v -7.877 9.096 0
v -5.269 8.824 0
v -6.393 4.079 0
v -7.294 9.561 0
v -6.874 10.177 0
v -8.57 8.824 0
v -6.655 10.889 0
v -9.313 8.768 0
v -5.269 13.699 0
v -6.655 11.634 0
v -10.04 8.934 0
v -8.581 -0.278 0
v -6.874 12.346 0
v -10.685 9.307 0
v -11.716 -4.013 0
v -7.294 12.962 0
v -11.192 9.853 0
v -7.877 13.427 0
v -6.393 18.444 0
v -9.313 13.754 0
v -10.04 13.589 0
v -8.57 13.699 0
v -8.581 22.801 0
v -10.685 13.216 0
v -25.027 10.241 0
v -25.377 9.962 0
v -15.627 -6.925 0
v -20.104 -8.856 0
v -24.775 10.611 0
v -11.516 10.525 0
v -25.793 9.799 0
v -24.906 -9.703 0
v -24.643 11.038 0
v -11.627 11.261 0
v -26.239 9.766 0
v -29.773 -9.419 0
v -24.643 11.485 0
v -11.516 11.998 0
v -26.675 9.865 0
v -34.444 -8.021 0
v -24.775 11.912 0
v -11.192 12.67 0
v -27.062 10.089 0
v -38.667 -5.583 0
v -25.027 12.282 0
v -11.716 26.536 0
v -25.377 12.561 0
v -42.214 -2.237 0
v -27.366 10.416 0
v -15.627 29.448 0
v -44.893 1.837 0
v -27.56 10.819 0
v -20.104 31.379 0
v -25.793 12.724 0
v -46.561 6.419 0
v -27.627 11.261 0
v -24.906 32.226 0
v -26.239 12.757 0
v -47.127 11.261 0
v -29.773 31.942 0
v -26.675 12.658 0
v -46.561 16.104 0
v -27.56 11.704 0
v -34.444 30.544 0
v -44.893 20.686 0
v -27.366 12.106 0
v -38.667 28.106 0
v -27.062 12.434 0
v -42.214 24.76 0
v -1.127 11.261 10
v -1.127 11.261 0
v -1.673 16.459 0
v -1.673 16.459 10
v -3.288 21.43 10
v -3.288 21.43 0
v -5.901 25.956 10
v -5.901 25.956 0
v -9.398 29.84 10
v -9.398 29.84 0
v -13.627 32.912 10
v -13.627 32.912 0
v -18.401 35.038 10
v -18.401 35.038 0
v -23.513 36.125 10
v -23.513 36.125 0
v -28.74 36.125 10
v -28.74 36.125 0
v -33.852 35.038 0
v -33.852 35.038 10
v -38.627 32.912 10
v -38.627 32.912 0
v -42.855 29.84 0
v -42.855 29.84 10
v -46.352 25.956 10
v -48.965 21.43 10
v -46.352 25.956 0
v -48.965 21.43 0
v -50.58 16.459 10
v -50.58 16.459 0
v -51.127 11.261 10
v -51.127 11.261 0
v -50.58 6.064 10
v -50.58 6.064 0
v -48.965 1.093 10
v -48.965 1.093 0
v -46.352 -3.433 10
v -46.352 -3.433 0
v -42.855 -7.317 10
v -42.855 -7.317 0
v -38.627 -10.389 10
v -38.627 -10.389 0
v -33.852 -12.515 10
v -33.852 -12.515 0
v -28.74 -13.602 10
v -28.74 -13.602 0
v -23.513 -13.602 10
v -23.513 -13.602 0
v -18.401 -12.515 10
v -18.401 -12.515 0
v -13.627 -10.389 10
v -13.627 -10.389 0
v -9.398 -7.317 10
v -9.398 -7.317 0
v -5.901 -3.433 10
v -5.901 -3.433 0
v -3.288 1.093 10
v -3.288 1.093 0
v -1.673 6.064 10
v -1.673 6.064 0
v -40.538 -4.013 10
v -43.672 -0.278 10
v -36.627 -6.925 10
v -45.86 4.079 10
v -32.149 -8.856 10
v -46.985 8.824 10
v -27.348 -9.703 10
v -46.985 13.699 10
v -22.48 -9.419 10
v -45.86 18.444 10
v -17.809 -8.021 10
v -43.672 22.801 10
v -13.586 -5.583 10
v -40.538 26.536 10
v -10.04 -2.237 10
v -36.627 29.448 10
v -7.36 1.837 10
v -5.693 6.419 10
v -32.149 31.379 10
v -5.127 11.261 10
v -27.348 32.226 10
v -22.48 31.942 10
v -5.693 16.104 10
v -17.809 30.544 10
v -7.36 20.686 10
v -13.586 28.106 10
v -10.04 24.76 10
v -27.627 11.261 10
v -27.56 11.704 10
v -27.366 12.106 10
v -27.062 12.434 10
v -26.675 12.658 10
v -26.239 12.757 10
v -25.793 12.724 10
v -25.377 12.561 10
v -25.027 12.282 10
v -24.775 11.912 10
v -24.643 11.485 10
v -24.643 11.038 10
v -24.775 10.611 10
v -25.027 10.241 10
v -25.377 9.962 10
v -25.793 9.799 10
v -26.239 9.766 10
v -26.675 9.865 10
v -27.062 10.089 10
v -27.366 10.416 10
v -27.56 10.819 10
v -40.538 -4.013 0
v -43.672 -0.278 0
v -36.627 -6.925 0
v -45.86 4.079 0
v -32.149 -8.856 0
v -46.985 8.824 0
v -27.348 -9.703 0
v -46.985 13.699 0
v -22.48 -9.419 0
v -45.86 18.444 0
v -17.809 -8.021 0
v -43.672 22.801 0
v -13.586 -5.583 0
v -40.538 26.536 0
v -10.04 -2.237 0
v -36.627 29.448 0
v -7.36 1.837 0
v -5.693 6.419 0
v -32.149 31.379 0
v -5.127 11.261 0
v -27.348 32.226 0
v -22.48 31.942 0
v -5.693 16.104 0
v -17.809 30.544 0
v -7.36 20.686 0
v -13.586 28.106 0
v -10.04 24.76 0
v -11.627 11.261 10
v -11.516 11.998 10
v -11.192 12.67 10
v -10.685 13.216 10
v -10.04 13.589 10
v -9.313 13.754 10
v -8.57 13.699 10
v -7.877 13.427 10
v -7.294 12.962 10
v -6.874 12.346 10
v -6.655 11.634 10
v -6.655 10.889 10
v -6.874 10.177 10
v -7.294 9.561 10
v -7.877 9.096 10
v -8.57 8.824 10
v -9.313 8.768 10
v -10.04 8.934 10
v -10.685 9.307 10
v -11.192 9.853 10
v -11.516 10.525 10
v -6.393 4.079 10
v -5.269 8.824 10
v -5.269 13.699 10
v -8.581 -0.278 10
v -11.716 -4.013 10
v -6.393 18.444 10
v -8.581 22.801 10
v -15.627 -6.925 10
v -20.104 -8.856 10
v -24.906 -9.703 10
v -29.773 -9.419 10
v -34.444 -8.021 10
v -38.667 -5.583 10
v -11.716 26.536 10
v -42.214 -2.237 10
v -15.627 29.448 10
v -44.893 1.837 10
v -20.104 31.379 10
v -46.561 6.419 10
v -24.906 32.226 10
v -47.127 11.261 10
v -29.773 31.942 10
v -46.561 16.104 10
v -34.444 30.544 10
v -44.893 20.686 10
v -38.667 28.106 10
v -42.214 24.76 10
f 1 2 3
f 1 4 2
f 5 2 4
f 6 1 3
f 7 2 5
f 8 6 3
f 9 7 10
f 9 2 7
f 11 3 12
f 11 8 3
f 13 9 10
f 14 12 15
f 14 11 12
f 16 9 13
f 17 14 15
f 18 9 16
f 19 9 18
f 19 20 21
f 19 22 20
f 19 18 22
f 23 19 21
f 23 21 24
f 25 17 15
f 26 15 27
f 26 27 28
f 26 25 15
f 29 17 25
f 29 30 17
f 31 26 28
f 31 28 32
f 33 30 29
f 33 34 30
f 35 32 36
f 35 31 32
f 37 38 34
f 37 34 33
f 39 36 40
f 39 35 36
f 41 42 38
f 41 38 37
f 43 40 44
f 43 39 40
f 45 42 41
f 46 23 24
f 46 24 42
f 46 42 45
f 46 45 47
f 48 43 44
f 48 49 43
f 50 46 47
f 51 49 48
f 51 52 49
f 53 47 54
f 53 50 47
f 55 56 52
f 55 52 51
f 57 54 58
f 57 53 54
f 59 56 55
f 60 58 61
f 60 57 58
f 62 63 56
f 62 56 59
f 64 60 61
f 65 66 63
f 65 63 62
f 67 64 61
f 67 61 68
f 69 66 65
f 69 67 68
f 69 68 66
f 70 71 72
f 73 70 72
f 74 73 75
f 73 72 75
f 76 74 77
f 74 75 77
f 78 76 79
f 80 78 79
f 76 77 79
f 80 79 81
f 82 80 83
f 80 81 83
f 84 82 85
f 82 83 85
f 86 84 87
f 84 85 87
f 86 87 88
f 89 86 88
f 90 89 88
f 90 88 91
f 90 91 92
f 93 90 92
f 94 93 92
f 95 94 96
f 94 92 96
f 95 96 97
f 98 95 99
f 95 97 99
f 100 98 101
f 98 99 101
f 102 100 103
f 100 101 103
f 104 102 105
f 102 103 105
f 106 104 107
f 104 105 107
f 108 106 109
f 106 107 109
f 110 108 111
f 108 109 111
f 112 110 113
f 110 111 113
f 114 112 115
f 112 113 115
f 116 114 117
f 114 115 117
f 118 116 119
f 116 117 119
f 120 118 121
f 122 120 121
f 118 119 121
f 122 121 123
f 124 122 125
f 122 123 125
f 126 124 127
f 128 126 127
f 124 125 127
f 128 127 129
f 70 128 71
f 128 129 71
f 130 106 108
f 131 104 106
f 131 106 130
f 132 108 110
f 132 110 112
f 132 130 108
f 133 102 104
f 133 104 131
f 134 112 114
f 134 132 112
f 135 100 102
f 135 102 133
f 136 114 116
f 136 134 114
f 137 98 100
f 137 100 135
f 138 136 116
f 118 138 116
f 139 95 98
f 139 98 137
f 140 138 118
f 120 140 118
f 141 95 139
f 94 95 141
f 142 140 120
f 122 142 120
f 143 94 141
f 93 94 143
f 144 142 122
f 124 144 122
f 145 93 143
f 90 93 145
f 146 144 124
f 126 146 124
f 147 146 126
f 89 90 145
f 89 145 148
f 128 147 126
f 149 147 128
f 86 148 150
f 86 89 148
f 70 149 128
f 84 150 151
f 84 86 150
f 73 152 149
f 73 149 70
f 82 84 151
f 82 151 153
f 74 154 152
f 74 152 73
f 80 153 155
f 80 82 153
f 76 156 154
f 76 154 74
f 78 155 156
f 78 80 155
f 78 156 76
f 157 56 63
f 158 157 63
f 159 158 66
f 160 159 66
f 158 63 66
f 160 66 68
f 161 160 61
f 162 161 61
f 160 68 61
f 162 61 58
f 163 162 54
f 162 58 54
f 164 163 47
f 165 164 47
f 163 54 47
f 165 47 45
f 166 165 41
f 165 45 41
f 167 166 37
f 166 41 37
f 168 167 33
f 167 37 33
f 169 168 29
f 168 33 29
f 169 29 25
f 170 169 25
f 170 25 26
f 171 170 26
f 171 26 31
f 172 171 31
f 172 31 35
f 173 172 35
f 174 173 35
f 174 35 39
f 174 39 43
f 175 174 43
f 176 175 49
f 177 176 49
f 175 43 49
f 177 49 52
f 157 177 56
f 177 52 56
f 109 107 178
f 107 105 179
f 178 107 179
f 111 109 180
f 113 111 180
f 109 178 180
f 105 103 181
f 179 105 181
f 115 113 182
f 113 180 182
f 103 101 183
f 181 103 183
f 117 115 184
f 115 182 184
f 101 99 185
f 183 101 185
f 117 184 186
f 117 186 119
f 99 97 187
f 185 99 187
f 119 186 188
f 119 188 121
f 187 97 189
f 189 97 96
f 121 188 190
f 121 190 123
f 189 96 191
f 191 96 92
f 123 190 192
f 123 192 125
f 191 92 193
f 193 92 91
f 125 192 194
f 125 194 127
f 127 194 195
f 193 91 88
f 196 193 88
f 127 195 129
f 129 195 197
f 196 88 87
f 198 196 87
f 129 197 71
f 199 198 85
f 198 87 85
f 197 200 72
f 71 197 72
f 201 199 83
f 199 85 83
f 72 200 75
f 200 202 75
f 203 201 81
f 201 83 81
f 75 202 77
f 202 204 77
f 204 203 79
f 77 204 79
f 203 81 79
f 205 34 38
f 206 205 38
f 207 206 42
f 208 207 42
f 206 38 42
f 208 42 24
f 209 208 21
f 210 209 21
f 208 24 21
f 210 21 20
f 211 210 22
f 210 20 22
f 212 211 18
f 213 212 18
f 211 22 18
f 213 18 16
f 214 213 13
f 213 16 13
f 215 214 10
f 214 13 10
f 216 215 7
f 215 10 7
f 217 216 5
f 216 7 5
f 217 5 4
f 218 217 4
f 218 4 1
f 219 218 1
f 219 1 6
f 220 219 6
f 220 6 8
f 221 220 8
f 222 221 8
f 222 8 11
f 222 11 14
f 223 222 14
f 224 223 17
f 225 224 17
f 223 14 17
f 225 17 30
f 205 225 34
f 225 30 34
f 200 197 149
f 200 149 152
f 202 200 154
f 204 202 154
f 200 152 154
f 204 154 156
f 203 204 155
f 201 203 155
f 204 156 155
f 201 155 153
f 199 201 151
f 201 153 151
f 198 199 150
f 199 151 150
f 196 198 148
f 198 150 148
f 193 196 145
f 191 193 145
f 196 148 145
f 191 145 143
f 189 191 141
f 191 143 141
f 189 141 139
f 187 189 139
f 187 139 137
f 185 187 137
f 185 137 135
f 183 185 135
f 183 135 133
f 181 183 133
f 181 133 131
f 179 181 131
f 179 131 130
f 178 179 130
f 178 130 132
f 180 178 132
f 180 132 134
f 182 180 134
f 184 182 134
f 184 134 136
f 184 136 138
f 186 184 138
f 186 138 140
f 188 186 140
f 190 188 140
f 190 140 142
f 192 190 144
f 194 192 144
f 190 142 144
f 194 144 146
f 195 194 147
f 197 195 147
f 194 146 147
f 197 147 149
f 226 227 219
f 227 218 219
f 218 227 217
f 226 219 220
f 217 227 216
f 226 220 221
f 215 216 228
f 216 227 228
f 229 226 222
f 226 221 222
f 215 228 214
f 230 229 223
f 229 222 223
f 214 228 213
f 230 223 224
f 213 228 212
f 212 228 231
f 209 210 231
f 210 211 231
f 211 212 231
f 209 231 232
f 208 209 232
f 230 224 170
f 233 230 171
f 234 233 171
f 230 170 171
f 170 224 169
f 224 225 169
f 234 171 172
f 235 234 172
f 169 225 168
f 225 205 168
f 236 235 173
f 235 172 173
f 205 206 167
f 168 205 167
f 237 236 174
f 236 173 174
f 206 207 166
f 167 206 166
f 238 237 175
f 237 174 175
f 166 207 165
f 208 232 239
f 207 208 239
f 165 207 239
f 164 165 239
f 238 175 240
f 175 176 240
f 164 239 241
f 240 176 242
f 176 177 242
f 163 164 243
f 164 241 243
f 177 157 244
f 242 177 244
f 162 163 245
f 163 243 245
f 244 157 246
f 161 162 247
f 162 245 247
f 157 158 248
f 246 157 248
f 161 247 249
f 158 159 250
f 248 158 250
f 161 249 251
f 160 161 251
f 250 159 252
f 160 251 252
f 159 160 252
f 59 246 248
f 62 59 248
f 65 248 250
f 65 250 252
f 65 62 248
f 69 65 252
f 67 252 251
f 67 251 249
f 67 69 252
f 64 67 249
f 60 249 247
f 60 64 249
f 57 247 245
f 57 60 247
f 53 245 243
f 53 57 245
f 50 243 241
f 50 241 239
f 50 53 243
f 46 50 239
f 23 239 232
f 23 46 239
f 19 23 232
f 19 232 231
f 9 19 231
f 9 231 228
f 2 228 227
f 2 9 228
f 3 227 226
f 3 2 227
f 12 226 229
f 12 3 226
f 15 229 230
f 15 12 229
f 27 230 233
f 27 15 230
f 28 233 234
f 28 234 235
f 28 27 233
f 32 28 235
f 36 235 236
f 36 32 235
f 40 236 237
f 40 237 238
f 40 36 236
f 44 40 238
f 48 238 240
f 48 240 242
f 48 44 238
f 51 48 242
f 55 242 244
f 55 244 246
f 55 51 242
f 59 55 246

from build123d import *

# Parameters (mm, degrees)
SKETCH1_R           = 25
BOSS_EXTRUDE1_DEPTH = 10
SKETCH3_R           = 21
BOSS_EXTRUDE2_DEPTH = 10.0001
SKETCH4_R           = 21
SKETCH4_R_2         = 1.5
SKETCH4_R_3         = 2.5
BOSS_EXTRUDE3_DEPTH = 10


with BuildPart() as part:
    # Sketch1 → Boss-Extrude1 (new body)
    with BuildSketch(Plane.XY):
        with Locations((-26.126616779, 11.26147275)):
            Circle(SKETCH1_R)
    extrude(amount=BOSS_EXTRUDE1_DEPTH)


with BuildPart() as body_2:
    # Sketch3 → Boss-Extrude2 (new body)
    with BuildSketch(Plane.XY.offset(10)):
        with Locations((-26.126616779, 11.26147275)):
            Circle(SKETCH3_R)
    extrude(amount=-BOSS_EXTRUDE2_DEPTH)


with BuildPart() as part_1:
    add(part.part)

    # Combine1: cut body 2
    add(body_2.part, mode=Mode.SUBTRACT)


with BuildPart() as body_2_2:
    # Sketch4 → Boss-Extrude3 (new body)
    with BuildSketch(Plane(origin=(0, 0, 0), x_dir=(-1, 0, 0), z_dir=(0, 0, -1))):
        with Locations((26.126616779, 11.26147275)):
            Circle(SKETCH4_R)
        with Locations((26.126616779, 11.26147275)):
            Circle(SKETCH4_R_2, mode=Mode.SUBTRACT)
        with Locations((9.126616779, 11.26147275)):
            Circle(SKETCH4_R_3, mode=Mode.SUBTRACT)
    extrude(amount=-BOSS_EXTRUDE3_DEPTH)


solid = Compound([part_1.part, body_2_2.part])
